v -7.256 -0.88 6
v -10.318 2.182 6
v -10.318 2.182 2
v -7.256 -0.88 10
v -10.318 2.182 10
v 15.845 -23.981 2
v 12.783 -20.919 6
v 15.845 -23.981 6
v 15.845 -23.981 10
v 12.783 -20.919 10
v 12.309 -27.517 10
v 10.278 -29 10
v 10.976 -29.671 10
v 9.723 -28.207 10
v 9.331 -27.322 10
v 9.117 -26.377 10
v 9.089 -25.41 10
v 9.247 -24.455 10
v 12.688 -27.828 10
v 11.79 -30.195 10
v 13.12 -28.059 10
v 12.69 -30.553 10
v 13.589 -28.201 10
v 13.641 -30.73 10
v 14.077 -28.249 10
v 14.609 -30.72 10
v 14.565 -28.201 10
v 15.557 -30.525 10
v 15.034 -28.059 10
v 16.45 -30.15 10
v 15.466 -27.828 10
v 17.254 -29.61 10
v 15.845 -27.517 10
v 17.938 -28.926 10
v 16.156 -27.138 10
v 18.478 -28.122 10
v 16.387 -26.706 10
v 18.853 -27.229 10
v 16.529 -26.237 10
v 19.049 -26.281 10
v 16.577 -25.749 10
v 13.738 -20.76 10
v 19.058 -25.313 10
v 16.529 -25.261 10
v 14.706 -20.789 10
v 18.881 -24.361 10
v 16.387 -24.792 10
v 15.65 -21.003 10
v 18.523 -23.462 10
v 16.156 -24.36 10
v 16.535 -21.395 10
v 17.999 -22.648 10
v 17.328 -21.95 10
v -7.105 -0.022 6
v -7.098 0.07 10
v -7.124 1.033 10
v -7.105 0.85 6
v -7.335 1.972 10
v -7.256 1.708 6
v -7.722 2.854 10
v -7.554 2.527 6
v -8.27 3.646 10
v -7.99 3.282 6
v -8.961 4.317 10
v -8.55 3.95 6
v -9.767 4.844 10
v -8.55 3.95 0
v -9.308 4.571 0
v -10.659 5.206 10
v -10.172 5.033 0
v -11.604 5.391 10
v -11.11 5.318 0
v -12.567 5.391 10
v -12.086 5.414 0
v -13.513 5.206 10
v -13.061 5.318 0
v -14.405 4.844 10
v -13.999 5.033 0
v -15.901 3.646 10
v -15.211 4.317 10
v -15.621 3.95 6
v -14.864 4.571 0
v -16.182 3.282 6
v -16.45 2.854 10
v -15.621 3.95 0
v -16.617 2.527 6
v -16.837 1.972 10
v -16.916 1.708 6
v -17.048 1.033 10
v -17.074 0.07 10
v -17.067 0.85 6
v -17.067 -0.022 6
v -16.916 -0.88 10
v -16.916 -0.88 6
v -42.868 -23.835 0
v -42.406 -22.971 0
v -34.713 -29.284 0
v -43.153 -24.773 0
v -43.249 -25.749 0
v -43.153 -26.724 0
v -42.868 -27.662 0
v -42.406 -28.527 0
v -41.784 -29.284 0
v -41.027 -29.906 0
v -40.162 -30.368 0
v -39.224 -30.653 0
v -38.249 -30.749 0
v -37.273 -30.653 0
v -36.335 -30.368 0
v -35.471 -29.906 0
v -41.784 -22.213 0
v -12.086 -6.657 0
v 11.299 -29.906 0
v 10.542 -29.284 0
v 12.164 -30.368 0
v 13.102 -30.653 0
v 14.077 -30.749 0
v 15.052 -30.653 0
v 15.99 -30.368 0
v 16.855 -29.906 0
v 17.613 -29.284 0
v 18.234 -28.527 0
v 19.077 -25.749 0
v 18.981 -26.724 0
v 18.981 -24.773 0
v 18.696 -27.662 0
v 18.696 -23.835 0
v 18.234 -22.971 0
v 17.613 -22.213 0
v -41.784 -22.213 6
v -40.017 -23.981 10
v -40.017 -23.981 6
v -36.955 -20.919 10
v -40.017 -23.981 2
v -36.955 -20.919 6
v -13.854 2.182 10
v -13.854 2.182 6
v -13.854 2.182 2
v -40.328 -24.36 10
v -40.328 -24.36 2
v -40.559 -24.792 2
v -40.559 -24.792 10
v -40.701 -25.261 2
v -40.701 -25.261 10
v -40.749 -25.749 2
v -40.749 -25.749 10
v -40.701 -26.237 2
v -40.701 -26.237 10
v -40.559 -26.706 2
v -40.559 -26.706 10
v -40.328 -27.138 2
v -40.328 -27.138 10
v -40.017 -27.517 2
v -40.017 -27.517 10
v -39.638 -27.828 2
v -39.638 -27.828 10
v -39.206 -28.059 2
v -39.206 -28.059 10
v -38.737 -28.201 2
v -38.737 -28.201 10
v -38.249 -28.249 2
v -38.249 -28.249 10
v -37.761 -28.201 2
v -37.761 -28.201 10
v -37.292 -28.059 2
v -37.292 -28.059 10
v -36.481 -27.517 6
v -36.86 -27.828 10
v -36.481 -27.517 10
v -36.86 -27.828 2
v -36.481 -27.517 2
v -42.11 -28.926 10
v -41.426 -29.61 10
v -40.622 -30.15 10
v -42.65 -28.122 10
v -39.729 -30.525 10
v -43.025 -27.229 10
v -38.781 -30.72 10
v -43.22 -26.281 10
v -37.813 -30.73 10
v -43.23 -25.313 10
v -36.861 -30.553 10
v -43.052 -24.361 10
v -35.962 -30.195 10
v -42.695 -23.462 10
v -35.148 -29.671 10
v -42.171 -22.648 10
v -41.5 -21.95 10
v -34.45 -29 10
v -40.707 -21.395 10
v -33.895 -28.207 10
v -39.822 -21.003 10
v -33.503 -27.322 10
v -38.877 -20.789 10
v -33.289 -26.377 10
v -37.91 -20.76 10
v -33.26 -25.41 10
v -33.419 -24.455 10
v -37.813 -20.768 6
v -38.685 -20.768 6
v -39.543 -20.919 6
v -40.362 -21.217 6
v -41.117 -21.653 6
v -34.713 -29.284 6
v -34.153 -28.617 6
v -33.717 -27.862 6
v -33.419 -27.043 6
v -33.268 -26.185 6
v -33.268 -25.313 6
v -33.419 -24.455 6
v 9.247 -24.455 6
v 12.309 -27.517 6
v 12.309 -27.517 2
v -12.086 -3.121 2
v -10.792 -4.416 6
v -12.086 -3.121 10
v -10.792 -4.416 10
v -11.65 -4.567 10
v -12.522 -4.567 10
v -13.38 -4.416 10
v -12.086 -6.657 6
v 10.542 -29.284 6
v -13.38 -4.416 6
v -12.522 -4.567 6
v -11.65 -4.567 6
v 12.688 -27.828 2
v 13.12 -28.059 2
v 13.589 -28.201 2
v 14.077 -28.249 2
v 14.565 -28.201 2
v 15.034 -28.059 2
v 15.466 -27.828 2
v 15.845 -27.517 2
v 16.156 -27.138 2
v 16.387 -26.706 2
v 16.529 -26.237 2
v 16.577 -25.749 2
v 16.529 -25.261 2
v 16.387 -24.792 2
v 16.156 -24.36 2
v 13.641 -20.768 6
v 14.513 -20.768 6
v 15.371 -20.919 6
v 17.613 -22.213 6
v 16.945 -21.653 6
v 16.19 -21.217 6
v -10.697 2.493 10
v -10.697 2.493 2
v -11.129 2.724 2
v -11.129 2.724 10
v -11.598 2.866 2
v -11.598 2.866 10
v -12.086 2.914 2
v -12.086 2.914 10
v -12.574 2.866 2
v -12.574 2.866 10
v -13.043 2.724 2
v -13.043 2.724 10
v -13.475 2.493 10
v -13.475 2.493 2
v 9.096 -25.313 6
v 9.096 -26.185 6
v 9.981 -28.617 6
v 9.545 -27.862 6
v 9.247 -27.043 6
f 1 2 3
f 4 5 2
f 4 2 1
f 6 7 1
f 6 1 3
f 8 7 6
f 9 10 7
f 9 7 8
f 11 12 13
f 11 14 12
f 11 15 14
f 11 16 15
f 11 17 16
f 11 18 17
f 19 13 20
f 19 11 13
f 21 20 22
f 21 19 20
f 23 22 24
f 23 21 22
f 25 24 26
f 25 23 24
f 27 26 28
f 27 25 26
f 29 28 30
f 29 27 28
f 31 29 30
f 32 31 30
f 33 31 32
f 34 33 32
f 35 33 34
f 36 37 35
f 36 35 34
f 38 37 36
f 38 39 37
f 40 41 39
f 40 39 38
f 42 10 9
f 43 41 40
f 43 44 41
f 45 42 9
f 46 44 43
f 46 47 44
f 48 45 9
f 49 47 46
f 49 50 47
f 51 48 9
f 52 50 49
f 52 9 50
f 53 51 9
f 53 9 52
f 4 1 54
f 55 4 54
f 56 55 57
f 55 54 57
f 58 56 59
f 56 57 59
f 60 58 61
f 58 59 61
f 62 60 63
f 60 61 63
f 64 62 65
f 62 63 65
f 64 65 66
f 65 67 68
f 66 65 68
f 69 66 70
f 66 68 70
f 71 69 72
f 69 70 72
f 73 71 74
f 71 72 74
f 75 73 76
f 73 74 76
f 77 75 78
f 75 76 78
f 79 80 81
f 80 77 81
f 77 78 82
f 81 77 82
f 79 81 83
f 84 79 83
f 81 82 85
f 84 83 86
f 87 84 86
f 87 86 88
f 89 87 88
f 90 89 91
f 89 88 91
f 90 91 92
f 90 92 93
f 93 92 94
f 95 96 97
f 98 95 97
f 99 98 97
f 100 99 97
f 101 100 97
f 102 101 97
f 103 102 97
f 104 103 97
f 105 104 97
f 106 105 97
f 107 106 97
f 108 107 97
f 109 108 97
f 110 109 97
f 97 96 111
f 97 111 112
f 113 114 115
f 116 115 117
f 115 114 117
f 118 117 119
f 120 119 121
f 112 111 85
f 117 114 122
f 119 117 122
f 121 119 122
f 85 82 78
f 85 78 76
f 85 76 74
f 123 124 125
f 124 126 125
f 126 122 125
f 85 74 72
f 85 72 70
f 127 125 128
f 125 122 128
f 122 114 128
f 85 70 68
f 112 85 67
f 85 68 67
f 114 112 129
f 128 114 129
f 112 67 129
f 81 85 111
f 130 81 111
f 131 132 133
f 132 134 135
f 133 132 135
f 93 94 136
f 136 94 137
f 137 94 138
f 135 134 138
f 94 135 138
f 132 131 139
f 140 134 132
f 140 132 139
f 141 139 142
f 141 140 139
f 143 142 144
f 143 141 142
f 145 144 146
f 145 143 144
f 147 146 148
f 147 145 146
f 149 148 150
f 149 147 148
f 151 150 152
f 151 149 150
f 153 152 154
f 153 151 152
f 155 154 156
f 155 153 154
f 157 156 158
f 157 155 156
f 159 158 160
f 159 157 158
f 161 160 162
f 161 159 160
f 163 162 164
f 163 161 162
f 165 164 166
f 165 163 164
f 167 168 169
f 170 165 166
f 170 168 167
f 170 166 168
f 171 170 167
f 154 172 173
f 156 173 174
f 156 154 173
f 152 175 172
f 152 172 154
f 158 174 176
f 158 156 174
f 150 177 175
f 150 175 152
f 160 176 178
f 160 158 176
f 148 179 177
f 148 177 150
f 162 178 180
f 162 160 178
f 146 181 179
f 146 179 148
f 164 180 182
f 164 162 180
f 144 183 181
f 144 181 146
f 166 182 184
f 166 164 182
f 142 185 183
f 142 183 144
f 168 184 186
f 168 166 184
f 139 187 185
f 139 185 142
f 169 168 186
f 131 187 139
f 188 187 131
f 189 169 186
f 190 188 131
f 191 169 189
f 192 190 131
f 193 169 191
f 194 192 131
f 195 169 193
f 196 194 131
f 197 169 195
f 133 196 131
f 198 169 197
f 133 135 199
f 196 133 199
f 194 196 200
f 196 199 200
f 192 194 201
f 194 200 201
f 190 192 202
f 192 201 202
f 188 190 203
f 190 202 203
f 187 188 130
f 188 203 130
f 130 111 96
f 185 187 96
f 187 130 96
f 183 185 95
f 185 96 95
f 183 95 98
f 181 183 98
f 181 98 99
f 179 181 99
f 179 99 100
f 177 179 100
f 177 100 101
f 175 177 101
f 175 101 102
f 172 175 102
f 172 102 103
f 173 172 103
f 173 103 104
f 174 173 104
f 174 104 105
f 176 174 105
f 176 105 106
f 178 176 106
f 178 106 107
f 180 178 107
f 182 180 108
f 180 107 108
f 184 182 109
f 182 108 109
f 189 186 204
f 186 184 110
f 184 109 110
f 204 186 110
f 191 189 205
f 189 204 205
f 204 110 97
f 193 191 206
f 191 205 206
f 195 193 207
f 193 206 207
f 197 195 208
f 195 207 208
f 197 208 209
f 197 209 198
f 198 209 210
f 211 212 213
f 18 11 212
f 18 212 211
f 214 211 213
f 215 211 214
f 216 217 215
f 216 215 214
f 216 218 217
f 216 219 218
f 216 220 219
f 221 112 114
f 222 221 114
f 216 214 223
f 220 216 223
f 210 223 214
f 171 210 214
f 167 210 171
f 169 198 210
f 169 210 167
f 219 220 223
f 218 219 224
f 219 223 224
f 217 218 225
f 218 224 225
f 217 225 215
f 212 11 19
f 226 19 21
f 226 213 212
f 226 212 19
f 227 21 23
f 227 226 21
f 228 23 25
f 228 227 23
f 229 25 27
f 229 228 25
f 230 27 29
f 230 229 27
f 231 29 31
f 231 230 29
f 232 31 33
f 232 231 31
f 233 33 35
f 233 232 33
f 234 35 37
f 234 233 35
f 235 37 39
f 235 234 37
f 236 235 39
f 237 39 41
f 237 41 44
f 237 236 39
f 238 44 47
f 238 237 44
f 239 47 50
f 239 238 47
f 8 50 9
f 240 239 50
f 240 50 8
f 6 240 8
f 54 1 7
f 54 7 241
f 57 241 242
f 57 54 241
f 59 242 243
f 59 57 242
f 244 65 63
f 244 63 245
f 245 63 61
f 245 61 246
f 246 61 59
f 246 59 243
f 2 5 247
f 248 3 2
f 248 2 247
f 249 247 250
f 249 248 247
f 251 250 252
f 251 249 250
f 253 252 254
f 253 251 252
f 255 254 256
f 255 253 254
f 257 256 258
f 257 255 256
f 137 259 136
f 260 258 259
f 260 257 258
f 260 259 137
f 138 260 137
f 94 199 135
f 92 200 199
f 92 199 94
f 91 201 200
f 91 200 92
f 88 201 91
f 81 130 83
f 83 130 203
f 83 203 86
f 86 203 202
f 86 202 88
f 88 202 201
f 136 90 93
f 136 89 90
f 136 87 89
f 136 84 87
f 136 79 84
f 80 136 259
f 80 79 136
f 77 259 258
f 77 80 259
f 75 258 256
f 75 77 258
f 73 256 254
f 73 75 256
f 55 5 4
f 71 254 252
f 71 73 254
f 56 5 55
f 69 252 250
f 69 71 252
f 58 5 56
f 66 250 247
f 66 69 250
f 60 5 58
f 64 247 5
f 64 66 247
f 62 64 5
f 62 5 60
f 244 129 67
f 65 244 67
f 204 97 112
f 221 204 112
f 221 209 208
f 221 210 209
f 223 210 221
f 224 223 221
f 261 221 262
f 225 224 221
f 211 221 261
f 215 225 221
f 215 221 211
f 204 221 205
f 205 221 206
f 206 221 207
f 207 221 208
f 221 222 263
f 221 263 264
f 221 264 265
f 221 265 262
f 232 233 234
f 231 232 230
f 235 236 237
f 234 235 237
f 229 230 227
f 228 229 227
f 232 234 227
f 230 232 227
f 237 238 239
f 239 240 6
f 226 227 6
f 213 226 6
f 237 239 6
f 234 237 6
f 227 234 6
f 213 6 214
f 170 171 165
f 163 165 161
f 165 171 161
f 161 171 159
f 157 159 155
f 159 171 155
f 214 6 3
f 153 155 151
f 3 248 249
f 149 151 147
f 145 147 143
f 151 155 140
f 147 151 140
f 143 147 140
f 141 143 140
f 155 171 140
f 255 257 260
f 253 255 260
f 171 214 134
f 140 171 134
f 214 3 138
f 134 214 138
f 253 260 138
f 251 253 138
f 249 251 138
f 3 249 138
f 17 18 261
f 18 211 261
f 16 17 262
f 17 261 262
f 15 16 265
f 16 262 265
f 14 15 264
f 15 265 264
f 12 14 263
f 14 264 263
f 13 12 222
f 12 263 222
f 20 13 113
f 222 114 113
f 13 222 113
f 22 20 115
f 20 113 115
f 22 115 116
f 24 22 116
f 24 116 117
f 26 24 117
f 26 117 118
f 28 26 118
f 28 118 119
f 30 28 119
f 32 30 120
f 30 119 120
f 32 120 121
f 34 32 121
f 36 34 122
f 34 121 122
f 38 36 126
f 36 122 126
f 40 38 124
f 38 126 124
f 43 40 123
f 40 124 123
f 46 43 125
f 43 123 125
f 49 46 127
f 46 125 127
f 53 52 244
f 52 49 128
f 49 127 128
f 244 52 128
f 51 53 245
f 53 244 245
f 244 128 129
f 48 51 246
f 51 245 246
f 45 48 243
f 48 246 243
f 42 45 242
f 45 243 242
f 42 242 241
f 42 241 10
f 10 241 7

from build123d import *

# Parameters (mm, degrees)
SKETCH_1_R          = 5
SKETCH_1_R_2        = 2.5
EXTRUDE_1_DEPTH     = 10
EXTRUDE_1_2_DEPTH   = 10
EXTRUDE_1_3_DEPTH   = 10
EXTRUDE_2_DEPTH     = 6
EXTRUDE_4_DEPTH     = 6
CUT_EXTRUDE_1_DEPTH = 4
SKETCH_5_R          = 3.75
SKETCH_5_R_2        = 2.5
EXTRUDE_3_DEPTH     = 2
CUT_EXTRUDE_2_DEPTH = 4
CUT_EXTRUDE_3_DEPTH = 8
SKETCH_11_R         = 2.5
EXTRUDE_9_DEPTH     = 2


with BuildPart() as part:
    # Эскиз1 → Бобышка-Вытянуть1 (new body)
    with BuildSketch(Plane.XY):
        with Locations((-12.085916667, 0.414052586)):
            Circle(SKETCH_1_R)
        with Locations((-12.085916667, 0.414052586)):
            Circle(SKETCH_1_R_2, mode=Mode.SUBTRACT)
    extrude(amount=EXTRUDE_1_DEPTH)



with BuildPart() as body_2:
    # Эскиз1 → Extrude 1 2 (new body)
    with BuildSketch(Plane.XY):
        with Locations((-38.24886757, -25.748898318)):
            Circle(SKETCH_1_R)
        with Locations((-38.24886757, -25.748898318)):
            Circle(SKETCH_1_R_2, mode=Mode.SUBTRACT)
    extrude(amount=EXTRUDE_1_2_DEPTH)


with BuildPart() as body_3:
    # Эскиз1 → Extrude 1 3 (new body)
    with BuildSketch(Plane.XY):
        with Locations((14.077034237, -25.748898318)):
            Circle(SKETCH_1_R)
        with Locations((14.077034237, -25.748898318)):
            Circle(SKETCH_1_R_2, mode=Mode.SUBTRACT)
    extrude(amount=EXTRUDE_1_3_DEPTH)


with BuildPart() as part_1:
    add(part.part)

    add(body_2.part)  # Бобышка-Вытянуть2 merges body 2
    # Эскиз3 → Бобышка-Вытянуть2 (add)
    with BuildSketch(Plane(origin=(0, 0, 0), x_dir=(-1, 0, 0), z_dir=(0, 0, -1))):
        Polygon((12.085916667, 0.414052586), (15.621450572, 3.949586492), (41.784401476, -22.213364412), (34.713333665, -29.284432224), (8.550382761, -3.12148132), align=None)
    extrude(amount=-EXTRUDE_2_DEPTH)


    add(body_3.part)  # Бобышка-Вытянуть4 merges body 3
    # Эскиз9 → Бобышка-Вытянуть4 (add)
    with BuildSketch(Plane(origin=(0, 0, 0), x_dir=(-1, 0, 0), z_dir=(0, 0, -1))):
        Polygon((-14.077034237, -25.748898318), (-17.612568143, -22.213364412), (8.550382761, 3.949586492), (15.621450572, -3.12148132), (-10.541500331, -29.284432224), align=None)
    extrude(amount=-EXTRUDE_4_DEPTH)

    # Эскиз4 → Вырез-Вытянуть1 (cut)
    with BuildSketch(Plane.XY.offset(6)):
        Polygon((-13.85368362, 2.181819539), (-10.318149714, -1.353714367), (-36.481100617, -27.516665271), (-40.016634523, -23.981131365), align=None)
    extrude(amount=-CUT_EXTRUDE_1_DEPTH, mode=Mode.SUBTRACT)

    # Эскиз5 → Бобышка-Вытянуть3 (add)
    with BuildSketch(Plane(origin=(0, 0, 0), x_dir=(-1, 0, 0), z_dir=(0, 0, -1))):
        with Locations((12.969800143, 1.297936063)):
            Circle(SKETCH_5_R)
        with Locations((38.24886757, -25.748898318)):
            Circle(SKETCH_5_R_2)
    extrude(amount=-EXTRUDE_3_DEPTH)

    # Эскиз4<2> → Вырез-Вытянуть2 (cut)
    with BuildSketch(Plane.XY.offset(6)):
        Polygon((-13.85368362, 2.181819539), (-10.318149714, -1.353714367), (-36.481100617, -27.516665271), (-40.016634523, -23.981131365), align=None)
    extrude(amount=CUT_EXTRUDE_2_DEPTH, mode=Mode.SUBTRACT)

    # Эскиз10 → Вырез-Вытянуть3 (cut)
    with BuildSketch(Plane.XY.offset(10)):
        Polygon((14.077034237, -25.748898318), (12.309267284, -27.516665271), (-13.85368362, -1.353714367), (-12.085916667, 0.414052586), (-10.318149714, 2.181819539), (15.84480119, -23.981131365), align=None)
    extrude(amount=-CUT_EXTRUDE_3_DEPTH, mode=Mode.SUBTRACT)

    # Эскиз11 → Бобышка-Вытянуть9 (add)
    with BuildSketch(Plane(origin=(0, 0, 0), x_dir=(-1, 0, 0), z_dir=(0, 0, -1))):
        with Locations((-14.077034237, -25.748898318)):
            Circle(SKETCH_11_R)
    extrude(amount=-EXTRUDE_9_DEPTH)


solid = part_1.part
